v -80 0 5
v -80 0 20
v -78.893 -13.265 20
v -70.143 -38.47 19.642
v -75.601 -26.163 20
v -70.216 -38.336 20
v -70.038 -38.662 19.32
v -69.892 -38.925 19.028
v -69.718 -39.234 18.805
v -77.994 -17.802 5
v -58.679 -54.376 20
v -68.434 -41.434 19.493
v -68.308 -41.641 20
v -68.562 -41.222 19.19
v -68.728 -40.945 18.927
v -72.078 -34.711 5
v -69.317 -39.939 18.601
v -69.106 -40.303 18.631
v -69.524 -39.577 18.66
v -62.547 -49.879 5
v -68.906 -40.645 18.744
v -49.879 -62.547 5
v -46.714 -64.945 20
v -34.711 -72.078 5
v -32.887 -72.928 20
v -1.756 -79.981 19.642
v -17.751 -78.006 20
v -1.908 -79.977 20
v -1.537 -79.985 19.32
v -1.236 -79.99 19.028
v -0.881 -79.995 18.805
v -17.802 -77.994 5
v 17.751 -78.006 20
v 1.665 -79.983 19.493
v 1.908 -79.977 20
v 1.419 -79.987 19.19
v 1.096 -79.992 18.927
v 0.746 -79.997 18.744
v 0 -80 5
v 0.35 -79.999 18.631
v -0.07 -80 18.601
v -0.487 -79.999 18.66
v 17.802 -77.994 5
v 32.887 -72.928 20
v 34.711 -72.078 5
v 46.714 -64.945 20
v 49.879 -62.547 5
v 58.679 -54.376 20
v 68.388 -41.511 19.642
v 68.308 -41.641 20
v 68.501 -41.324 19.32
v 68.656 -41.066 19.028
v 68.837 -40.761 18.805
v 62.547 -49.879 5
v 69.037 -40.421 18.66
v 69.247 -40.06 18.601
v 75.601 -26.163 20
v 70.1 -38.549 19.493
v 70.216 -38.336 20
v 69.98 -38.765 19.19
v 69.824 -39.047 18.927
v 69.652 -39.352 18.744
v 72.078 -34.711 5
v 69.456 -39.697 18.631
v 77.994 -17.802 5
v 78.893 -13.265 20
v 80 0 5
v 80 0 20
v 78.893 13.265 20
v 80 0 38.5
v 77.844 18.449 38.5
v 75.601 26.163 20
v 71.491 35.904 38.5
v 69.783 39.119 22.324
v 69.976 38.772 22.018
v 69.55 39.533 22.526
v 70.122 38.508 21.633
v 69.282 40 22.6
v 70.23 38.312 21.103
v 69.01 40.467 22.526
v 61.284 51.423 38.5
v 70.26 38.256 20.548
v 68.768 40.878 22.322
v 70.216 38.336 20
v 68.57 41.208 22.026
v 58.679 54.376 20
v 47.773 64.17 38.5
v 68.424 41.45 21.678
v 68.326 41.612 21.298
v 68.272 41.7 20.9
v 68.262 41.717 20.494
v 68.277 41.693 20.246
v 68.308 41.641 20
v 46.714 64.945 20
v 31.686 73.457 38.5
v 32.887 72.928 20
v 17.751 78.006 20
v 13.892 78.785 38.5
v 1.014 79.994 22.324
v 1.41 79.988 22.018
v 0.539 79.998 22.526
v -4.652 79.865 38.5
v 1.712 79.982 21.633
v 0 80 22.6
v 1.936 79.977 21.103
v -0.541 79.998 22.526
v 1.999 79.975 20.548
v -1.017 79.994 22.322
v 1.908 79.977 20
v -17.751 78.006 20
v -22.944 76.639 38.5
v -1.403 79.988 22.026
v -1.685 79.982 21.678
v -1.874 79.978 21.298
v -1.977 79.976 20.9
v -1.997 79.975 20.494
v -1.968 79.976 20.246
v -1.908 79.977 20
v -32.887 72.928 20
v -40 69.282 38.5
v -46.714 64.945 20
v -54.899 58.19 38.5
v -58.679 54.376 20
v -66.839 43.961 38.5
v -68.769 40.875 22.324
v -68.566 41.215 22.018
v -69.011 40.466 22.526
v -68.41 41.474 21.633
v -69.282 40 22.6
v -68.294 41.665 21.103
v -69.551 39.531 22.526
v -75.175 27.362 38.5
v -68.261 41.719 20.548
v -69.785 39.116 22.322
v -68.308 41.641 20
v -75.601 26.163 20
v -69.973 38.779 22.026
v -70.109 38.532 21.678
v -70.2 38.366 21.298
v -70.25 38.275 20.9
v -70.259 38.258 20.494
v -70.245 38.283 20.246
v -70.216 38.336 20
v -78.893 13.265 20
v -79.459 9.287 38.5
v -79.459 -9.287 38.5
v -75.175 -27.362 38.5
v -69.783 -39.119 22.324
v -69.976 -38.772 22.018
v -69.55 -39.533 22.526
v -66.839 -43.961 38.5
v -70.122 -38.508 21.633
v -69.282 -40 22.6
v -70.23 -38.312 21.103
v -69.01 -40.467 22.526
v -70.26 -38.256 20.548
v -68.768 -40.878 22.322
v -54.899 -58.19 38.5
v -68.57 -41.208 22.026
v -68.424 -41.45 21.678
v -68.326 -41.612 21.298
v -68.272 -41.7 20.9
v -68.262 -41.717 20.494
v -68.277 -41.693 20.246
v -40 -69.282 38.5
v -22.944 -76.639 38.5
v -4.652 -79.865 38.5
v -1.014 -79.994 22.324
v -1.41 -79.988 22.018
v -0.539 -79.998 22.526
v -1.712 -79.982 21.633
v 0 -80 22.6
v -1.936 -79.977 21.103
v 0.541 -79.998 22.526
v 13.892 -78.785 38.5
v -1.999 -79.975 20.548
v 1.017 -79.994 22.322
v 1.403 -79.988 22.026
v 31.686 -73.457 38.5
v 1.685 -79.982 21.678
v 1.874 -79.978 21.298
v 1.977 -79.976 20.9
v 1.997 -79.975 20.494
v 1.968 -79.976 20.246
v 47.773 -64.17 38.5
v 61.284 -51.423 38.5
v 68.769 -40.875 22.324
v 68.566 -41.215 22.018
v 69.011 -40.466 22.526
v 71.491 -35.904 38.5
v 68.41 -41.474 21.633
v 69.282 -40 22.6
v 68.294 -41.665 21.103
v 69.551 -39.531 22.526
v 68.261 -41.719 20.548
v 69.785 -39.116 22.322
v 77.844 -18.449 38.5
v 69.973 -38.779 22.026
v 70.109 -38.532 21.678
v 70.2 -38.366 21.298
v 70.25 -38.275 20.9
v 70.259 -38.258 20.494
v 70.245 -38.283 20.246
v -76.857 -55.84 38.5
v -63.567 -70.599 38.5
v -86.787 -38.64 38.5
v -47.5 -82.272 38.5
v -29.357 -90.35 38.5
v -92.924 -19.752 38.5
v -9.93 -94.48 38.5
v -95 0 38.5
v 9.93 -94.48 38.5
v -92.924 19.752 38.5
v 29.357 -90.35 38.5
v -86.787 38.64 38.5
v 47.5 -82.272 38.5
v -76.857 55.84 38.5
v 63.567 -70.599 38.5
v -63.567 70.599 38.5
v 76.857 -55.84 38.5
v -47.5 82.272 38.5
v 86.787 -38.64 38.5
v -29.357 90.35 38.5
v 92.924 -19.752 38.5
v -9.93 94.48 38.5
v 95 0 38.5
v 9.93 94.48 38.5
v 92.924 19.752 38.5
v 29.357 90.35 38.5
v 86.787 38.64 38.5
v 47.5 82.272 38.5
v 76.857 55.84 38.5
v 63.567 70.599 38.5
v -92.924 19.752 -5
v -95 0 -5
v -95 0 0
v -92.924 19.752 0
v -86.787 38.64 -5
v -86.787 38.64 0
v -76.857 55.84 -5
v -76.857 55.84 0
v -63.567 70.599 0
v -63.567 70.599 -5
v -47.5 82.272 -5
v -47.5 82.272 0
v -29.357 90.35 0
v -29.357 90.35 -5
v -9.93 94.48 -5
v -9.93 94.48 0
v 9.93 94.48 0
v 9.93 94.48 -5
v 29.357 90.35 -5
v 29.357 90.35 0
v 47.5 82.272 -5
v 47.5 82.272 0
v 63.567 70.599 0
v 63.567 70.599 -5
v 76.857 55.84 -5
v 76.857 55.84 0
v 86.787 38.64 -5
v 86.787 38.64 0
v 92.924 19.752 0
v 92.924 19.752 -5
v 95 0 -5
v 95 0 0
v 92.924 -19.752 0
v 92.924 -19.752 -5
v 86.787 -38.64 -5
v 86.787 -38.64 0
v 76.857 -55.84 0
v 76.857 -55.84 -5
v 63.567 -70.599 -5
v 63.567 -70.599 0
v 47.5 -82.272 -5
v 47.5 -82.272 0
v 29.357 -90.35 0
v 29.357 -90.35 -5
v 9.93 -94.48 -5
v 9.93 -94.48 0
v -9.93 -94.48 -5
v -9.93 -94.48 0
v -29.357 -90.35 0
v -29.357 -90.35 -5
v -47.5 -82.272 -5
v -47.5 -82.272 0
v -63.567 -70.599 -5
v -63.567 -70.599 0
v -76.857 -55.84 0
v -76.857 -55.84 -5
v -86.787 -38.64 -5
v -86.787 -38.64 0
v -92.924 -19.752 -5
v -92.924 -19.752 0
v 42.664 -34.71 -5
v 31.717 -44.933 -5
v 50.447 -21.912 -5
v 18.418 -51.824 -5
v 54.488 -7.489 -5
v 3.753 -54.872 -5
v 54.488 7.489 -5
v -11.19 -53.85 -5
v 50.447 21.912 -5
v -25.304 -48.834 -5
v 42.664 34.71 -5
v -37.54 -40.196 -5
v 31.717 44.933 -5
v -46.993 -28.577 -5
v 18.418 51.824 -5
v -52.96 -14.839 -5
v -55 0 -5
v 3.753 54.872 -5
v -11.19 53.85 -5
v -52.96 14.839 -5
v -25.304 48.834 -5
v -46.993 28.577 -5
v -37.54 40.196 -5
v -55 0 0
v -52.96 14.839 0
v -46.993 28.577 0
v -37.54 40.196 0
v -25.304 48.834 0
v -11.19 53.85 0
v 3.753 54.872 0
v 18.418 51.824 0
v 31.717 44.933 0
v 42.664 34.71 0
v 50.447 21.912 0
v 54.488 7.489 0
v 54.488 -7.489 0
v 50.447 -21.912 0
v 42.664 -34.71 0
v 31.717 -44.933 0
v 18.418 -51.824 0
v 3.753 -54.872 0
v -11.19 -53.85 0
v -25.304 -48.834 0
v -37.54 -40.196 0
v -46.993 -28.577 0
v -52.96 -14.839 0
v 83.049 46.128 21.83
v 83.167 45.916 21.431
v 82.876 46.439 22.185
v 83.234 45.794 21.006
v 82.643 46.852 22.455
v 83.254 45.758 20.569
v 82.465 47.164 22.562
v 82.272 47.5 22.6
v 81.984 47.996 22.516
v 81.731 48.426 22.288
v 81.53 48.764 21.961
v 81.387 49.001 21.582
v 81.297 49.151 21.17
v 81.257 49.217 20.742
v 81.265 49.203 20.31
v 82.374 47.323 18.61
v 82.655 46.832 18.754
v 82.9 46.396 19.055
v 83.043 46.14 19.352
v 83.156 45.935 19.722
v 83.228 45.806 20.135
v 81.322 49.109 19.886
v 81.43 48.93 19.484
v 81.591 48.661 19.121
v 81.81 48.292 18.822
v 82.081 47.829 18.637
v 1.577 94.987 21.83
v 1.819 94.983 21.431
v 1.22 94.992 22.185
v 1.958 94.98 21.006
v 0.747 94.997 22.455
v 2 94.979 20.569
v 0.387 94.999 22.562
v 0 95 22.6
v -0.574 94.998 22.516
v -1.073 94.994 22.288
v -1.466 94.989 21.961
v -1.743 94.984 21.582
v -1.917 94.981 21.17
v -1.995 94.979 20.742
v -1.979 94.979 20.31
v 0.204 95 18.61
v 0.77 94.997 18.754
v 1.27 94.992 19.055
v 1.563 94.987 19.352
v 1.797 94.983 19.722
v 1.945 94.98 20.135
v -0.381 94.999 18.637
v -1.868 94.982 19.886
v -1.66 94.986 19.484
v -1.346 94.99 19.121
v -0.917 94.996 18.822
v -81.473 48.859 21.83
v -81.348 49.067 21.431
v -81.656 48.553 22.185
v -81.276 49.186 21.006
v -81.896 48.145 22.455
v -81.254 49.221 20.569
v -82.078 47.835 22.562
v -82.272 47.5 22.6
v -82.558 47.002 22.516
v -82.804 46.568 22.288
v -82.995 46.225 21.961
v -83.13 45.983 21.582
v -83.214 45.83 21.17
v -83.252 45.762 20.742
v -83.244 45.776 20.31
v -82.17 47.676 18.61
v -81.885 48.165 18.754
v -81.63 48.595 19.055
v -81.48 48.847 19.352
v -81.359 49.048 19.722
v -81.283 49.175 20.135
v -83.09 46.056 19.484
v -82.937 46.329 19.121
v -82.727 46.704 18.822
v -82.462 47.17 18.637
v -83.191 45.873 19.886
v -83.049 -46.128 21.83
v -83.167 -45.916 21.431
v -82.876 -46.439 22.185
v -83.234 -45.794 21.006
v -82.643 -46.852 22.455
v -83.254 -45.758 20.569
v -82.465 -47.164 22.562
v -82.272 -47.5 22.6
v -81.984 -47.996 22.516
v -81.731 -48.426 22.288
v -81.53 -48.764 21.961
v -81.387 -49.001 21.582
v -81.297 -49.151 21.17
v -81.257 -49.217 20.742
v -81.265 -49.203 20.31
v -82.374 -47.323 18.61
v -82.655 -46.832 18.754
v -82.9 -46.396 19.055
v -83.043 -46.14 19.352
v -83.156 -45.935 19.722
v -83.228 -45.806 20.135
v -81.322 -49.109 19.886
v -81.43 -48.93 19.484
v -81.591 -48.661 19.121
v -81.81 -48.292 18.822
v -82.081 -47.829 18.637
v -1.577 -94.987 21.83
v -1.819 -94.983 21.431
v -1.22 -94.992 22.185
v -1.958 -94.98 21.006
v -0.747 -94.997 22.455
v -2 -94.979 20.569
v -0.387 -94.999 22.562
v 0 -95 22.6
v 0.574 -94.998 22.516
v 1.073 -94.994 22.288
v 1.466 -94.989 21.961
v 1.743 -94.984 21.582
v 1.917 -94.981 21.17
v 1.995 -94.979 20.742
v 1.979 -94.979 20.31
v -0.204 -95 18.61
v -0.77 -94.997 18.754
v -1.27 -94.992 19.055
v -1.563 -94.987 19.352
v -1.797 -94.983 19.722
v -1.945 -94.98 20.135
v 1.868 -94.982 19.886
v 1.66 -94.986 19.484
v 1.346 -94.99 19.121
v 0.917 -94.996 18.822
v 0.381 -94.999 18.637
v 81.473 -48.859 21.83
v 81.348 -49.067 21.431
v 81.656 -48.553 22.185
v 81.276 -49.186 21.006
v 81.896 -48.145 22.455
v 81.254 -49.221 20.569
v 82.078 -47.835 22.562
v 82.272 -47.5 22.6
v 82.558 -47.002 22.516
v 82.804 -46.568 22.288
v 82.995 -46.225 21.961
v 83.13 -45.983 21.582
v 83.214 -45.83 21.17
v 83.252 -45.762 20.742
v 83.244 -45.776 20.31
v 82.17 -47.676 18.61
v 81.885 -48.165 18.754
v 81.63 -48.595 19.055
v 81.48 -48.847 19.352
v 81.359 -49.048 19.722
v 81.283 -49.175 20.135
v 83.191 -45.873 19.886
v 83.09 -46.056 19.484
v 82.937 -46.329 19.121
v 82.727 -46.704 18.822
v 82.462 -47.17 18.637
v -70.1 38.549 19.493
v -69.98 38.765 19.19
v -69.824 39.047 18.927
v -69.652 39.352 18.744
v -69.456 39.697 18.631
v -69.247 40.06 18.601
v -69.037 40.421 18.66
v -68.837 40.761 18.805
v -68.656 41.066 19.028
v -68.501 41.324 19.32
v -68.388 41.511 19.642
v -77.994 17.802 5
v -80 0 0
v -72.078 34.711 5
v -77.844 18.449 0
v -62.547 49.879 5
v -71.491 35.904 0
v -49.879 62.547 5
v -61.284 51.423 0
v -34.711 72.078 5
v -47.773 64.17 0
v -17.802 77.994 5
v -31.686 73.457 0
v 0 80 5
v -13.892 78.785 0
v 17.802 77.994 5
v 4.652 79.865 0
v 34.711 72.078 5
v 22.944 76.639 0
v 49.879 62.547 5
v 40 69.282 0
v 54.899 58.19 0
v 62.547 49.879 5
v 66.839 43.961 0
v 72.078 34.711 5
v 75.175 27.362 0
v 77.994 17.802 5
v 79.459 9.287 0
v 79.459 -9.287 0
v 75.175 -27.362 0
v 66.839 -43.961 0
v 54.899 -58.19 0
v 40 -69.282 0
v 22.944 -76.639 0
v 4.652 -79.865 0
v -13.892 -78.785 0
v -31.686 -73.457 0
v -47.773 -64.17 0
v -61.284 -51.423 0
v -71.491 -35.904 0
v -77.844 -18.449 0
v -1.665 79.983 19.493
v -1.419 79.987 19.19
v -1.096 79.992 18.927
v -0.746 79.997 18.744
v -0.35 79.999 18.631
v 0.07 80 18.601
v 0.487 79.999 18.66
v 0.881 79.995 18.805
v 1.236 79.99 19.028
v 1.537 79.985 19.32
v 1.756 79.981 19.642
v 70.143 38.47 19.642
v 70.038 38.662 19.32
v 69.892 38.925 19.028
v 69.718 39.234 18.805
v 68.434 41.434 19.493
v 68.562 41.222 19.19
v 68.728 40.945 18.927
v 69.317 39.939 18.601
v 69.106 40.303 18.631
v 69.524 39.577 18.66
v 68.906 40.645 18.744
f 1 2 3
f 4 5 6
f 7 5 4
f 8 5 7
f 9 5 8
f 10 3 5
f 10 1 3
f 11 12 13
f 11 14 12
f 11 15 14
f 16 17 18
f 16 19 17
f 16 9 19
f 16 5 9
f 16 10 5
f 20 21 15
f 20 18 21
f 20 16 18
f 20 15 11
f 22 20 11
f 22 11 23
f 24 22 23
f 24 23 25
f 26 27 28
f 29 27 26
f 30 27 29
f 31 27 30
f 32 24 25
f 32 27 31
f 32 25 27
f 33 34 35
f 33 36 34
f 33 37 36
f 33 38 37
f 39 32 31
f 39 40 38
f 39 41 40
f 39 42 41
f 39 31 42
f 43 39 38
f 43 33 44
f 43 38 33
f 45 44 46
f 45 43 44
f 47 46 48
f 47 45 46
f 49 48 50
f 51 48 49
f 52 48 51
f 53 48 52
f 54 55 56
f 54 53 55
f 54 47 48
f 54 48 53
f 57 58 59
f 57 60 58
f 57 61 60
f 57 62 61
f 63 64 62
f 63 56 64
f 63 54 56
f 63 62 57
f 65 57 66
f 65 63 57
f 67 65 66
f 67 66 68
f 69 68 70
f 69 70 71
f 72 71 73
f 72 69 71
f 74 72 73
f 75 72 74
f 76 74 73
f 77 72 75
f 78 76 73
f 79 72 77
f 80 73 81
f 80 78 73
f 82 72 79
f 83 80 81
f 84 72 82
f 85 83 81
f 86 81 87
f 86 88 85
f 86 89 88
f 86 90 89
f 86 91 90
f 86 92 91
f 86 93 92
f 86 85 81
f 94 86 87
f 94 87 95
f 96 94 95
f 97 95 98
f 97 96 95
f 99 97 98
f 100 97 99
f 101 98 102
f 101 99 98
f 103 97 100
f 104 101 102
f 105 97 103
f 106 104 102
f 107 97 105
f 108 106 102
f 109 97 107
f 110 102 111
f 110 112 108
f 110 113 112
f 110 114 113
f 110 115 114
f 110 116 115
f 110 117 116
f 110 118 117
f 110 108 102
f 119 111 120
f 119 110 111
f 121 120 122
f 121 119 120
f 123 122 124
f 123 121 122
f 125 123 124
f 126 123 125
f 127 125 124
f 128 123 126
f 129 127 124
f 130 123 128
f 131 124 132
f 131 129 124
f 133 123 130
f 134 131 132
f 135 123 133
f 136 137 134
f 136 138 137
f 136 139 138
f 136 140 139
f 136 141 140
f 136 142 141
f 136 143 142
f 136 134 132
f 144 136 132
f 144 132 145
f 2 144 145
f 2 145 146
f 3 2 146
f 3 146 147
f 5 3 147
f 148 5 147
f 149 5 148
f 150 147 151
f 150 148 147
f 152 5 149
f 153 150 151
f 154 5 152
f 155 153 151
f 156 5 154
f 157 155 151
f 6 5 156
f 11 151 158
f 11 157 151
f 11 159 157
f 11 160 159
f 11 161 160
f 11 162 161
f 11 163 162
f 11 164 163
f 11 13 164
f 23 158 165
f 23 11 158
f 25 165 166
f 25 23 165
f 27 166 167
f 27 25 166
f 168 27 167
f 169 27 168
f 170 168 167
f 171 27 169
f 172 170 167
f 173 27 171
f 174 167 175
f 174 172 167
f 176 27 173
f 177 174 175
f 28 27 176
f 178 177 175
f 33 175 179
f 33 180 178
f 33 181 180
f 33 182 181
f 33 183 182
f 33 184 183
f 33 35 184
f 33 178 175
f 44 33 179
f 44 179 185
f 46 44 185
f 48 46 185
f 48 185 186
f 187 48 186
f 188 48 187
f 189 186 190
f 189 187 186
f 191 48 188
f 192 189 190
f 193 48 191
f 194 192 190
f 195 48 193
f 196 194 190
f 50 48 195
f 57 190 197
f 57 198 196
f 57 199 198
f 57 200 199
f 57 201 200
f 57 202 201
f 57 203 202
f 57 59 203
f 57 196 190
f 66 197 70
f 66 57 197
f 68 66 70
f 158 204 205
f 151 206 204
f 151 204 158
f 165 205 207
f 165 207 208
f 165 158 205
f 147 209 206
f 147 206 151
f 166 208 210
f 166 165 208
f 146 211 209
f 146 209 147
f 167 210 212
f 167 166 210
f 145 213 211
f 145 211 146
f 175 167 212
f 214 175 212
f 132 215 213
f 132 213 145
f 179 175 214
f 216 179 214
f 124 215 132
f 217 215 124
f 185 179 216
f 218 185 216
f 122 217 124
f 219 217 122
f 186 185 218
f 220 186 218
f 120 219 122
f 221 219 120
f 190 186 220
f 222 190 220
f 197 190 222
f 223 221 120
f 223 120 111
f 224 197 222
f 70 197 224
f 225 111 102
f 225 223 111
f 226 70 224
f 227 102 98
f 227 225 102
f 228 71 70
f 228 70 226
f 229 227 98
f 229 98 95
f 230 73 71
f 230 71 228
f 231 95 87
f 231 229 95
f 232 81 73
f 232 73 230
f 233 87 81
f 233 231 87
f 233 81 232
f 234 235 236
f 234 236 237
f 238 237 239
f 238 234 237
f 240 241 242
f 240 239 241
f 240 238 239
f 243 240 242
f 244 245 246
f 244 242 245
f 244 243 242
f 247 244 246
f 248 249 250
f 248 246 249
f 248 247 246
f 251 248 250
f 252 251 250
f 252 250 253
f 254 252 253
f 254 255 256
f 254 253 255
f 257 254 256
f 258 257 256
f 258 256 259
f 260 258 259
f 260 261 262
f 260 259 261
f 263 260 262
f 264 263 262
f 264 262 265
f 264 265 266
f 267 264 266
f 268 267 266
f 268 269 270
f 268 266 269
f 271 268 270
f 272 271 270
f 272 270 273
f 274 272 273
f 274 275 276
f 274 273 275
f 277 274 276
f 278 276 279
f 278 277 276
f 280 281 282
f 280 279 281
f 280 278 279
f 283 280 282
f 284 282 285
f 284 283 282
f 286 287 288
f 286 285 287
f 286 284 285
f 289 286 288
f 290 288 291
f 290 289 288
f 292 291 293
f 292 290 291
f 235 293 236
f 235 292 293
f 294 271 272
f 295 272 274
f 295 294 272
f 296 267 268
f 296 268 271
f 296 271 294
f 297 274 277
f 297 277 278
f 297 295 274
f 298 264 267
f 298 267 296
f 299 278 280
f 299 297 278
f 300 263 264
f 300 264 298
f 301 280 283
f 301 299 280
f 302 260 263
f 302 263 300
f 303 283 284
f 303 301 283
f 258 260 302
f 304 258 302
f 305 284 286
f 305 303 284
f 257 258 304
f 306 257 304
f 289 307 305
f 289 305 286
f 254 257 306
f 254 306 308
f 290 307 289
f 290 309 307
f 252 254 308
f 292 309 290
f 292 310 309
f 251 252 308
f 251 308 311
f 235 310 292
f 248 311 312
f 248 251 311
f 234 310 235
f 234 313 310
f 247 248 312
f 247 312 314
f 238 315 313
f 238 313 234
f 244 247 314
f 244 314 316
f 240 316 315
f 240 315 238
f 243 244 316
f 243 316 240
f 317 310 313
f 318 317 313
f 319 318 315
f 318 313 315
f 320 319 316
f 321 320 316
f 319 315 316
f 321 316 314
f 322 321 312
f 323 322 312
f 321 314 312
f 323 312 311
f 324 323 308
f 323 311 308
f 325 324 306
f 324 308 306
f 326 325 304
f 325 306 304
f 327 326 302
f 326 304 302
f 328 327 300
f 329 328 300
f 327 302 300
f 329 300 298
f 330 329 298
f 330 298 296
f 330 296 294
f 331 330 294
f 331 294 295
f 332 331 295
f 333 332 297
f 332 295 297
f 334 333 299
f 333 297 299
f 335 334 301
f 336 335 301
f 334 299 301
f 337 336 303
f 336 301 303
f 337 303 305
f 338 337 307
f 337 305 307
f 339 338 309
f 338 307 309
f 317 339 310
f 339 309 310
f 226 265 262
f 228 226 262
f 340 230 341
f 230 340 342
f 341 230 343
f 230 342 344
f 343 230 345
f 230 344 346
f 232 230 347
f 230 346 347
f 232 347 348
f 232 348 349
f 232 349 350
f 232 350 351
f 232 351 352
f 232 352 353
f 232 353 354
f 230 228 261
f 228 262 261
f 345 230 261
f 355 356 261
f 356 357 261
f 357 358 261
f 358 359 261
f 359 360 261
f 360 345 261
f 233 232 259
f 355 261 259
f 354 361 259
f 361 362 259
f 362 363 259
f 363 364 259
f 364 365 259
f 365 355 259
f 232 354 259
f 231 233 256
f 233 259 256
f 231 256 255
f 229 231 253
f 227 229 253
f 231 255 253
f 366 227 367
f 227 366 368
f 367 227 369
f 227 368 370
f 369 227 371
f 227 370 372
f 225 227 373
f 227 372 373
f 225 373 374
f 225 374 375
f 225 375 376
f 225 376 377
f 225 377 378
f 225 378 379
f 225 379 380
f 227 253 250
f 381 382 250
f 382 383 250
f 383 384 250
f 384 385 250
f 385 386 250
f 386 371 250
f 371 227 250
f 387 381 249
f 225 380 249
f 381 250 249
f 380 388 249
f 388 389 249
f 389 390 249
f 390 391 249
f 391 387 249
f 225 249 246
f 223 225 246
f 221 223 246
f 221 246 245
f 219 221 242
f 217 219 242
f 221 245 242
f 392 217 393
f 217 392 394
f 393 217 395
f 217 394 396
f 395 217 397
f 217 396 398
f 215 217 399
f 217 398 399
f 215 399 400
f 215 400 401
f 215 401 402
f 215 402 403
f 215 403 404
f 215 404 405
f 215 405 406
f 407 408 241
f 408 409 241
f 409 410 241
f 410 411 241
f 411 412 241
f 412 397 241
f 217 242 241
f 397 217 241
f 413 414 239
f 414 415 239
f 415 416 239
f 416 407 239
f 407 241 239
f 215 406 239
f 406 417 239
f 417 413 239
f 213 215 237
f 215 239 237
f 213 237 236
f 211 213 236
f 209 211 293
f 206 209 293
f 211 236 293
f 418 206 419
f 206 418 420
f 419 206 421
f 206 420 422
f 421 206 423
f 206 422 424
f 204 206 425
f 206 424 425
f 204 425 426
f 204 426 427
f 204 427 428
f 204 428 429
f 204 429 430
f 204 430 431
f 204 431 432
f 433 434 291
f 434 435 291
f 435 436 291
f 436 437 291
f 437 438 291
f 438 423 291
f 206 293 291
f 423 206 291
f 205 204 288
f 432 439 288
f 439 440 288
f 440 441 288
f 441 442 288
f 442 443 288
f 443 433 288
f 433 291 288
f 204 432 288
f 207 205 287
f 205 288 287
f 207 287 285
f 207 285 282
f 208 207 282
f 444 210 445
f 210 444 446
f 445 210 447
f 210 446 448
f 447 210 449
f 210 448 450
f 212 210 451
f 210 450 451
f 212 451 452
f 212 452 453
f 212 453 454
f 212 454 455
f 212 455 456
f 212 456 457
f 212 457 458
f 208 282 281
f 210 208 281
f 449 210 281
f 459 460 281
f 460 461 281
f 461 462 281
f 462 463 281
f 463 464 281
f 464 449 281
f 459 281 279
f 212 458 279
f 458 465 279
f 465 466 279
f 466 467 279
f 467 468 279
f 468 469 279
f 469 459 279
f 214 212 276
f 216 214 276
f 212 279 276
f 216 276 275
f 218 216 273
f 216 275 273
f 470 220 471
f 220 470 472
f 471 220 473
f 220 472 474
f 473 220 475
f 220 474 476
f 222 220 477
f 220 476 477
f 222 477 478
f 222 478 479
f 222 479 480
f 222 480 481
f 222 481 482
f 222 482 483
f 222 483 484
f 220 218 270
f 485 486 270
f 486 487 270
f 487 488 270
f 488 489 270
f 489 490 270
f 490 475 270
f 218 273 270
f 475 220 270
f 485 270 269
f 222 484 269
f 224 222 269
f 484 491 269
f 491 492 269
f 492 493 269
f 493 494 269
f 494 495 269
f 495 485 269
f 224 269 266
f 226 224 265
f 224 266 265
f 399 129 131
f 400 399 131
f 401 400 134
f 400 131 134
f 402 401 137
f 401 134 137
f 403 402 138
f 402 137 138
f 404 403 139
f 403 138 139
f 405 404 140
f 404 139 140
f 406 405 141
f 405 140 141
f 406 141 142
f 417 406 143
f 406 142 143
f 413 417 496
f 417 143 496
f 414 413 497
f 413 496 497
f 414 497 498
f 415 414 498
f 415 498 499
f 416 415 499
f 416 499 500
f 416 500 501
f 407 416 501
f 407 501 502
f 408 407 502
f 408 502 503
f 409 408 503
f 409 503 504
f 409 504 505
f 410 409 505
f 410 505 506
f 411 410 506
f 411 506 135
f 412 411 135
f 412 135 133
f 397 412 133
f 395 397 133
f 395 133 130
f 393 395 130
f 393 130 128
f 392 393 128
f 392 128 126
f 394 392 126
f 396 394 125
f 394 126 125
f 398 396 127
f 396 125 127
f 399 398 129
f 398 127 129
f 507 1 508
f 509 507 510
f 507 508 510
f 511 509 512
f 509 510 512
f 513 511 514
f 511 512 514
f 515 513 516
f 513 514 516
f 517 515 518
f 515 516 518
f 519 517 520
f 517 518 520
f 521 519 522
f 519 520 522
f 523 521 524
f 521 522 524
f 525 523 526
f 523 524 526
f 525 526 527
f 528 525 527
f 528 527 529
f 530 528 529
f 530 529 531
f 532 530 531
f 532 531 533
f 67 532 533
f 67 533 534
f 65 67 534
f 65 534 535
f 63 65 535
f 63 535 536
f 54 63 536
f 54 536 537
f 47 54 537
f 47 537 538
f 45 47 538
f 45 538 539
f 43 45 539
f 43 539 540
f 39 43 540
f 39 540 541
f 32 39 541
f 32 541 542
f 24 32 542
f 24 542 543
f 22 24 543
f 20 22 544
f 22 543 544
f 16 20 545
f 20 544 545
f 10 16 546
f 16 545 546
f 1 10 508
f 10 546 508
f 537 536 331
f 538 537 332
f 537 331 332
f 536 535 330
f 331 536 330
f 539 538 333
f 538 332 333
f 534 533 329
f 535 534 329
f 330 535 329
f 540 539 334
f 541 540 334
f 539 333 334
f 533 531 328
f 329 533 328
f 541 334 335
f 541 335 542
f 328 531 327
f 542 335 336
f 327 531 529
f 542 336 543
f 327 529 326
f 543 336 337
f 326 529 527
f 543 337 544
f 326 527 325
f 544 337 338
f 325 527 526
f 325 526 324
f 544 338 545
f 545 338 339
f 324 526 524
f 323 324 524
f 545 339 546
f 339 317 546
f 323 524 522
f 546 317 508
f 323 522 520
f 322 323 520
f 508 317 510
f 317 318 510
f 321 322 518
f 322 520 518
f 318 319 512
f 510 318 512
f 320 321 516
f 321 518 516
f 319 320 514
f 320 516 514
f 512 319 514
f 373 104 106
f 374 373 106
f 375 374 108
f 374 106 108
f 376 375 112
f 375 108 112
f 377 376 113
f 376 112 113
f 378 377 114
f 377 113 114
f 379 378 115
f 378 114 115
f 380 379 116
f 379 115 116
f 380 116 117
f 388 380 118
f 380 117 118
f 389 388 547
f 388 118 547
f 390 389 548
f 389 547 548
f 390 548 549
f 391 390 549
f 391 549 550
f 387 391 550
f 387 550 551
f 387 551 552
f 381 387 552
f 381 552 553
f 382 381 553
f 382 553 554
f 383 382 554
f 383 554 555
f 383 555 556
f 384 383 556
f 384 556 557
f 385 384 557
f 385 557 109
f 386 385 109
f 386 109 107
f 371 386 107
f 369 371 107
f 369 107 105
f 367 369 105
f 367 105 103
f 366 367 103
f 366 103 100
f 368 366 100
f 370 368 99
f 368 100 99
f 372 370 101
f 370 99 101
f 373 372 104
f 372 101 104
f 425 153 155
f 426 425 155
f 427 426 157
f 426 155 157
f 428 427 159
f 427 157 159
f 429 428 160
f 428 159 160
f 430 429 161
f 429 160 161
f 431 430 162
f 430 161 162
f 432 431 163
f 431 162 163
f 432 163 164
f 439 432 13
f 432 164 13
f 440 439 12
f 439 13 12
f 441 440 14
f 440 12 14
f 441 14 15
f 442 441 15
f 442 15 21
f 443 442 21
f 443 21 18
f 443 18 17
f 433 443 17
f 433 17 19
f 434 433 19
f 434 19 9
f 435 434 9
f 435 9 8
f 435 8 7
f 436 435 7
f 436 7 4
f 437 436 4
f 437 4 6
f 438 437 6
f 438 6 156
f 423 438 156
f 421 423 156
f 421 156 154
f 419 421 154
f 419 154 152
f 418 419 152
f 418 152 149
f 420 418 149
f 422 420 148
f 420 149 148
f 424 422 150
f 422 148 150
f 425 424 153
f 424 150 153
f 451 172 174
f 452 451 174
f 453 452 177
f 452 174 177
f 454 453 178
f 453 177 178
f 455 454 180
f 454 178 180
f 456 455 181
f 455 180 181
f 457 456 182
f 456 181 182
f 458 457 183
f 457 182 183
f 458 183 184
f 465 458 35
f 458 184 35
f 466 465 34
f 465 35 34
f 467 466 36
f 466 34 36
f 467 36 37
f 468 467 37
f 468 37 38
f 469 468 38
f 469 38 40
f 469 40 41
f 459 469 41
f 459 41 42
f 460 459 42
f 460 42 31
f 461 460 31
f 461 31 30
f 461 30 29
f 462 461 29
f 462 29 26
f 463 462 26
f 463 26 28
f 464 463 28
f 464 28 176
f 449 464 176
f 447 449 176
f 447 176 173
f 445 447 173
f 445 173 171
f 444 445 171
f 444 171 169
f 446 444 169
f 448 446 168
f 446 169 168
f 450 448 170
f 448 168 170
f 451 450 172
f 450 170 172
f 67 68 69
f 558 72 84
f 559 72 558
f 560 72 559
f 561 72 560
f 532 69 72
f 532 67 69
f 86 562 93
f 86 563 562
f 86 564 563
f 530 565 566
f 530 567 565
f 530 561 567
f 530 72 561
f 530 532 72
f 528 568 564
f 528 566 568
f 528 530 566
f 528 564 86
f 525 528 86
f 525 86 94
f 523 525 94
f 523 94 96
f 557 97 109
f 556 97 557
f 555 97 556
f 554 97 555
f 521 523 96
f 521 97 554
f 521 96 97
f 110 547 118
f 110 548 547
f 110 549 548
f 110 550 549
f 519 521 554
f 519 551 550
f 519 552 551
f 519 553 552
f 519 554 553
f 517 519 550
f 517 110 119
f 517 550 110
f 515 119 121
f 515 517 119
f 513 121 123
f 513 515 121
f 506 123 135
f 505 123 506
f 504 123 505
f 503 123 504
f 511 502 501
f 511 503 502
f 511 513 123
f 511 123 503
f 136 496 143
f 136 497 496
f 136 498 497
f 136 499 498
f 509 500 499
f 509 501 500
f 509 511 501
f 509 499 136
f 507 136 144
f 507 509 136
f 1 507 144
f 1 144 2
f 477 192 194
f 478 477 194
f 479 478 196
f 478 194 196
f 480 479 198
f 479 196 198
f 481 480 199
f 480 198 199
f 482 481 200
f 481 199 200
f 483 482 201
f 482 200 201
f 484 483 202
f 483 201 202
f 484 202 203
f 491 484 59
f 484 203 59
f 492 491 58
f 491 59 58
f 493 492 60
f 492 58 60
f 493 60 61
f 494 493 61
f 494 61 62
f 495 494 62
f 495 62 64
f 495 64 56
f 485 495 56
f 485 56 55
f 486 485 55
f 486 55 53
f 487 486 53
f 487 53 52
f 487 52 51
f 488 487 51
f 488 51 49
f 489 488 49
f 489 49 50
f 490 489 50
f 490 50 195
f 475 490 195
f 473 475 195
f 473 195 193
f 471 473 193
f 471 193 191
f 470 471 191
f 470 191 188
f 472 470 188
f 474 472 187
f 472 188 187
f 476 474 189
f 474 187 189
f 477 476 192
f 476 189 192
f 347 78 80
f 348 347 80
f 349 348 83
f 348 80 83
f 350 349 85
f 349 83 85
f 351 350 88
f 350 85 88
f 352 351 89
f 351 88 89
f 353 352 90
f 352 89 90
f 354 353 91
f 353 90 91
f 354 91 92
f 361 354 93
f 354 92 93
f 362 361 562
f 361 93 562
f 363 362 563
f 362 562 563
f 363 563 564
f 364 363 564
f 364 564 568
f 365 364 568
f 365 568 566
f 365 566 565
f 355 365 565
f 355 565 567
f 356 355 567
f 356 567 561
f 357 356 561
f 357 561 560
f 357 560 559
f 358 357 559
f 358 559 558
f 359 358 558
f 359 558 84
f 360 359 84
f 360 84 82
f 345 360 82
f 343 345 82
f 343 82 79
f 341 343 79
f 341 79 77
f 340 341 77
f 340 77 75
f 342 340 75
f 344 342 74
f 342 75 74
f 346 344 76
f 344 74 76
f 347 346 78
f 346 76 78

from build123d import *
from build123d.topology import SkipClean

# Parameters (mm, degrees)
SKETCH_1_R               = 95
SKETCH_1_R_2             = 55
EXTRUDE_1_DEPTH          = 5
SKETCH_2_R               = 95
SKETCH_2_R_2             = 80
EXTRUDE_2_DEPTH          = 38.5
SKETCH_3_R               = 2
CUT_EXTRUDE_2_DEPTH      = 100
PATTERN_CIRCULAR_2_COUNT = 6
SKETCH_5_R               = 80
CUT_EXTRUDE_3_DEPTH      = 20
EXTRUDE_START            = 5
SKETCH_6_R               = 95
SKETCH_6_R_2             = 55
EXTRUDE_3_DEPTH          = 5


with BuildPart() as part:
    # 草图1 → 凸台-拉伸1 (new body)
    with BuildSketch(Plane.XY):
        Circle(SKETCH_1_R)
        Circle(SKETCH_1_R_2, mode=Mode.SUBTRACT)
    extrude(amount=EXTRUDE_1_DEPTH)

    # 草图2 → 凸台-拉伸2 (add)
    with BuildSketch(Plane.XY):
        Circle(SKETCH_2_R)
        Circle(SKETCH_2_R_2, mode=Mode.SUBTRACT)
    extrude(amount=EXTRUDE_2_DEPTH)

    # 草图3 → 切除-拉伸2 (cut)
    with BuildSketch(Plane(origin=(0, 0, 0), x_dir=(1, 0, 0), z_dir=(0, 1, 0))):
        with Locations((0, -20.6)):
            Circle(SKETCH_3_R)
    cut_extrude_2 = extrude(amount=-CUT_EXTRUDE_2_DEPTH, mode=Mode.SUBTRACT)

    # 阵列(圆周)2: 切除-拉伸2 ×6 about axis
    pattern_circular_2_axis = Axis((0, 0, 5), (0, 0, -1))
    for i in range(1, PATTERN_CIRCULAR_2_COUNT):
        add(cut_extrude_2.rotate(pattern_circular_2_axis, i * 360 / PATTERN_CIRCULAR_2_COUNT), mode=Mode.SUBTRACT)

    # 草图5 → 切除-拉伸3 (cut)
    with SkipClean():  # the faces are left unmerged after this step: merging them gives an invalid solid
        with BuildSketch(Plane(origin=(0, 0, 0), x_dir=(-1, 0, 0), z_dir=(0, 0, -1))):
            Circle(SKETCH_5_R)
        extrude(amount=-CUT_EXTRUDE_3_DEPTH, mode=Mode.SUBTRACT)
    add(part.part.scale(1), mode=Mode.REPLACE)  # the faces are merged on a copy

    # 草图6 → 凸台-拉伸3 (add)
    with SkipClean():  # the faces are left unmerged after this step: merging them gives an invalid solid
        with BuildSketch(Plane(origin=(0, 0, 0), x_dir=(-1, 0, 0), z_dir=(0, 0, -1)).offset(EXTRUDE_START)):
            Circle(SKETCH_6_R)
            Circle(SKETCH_6_R_2, mode=Mode.SUBTRACT)
        extrude(amount=-EXTRUDE_3_DEPTH)


solid = part.part
